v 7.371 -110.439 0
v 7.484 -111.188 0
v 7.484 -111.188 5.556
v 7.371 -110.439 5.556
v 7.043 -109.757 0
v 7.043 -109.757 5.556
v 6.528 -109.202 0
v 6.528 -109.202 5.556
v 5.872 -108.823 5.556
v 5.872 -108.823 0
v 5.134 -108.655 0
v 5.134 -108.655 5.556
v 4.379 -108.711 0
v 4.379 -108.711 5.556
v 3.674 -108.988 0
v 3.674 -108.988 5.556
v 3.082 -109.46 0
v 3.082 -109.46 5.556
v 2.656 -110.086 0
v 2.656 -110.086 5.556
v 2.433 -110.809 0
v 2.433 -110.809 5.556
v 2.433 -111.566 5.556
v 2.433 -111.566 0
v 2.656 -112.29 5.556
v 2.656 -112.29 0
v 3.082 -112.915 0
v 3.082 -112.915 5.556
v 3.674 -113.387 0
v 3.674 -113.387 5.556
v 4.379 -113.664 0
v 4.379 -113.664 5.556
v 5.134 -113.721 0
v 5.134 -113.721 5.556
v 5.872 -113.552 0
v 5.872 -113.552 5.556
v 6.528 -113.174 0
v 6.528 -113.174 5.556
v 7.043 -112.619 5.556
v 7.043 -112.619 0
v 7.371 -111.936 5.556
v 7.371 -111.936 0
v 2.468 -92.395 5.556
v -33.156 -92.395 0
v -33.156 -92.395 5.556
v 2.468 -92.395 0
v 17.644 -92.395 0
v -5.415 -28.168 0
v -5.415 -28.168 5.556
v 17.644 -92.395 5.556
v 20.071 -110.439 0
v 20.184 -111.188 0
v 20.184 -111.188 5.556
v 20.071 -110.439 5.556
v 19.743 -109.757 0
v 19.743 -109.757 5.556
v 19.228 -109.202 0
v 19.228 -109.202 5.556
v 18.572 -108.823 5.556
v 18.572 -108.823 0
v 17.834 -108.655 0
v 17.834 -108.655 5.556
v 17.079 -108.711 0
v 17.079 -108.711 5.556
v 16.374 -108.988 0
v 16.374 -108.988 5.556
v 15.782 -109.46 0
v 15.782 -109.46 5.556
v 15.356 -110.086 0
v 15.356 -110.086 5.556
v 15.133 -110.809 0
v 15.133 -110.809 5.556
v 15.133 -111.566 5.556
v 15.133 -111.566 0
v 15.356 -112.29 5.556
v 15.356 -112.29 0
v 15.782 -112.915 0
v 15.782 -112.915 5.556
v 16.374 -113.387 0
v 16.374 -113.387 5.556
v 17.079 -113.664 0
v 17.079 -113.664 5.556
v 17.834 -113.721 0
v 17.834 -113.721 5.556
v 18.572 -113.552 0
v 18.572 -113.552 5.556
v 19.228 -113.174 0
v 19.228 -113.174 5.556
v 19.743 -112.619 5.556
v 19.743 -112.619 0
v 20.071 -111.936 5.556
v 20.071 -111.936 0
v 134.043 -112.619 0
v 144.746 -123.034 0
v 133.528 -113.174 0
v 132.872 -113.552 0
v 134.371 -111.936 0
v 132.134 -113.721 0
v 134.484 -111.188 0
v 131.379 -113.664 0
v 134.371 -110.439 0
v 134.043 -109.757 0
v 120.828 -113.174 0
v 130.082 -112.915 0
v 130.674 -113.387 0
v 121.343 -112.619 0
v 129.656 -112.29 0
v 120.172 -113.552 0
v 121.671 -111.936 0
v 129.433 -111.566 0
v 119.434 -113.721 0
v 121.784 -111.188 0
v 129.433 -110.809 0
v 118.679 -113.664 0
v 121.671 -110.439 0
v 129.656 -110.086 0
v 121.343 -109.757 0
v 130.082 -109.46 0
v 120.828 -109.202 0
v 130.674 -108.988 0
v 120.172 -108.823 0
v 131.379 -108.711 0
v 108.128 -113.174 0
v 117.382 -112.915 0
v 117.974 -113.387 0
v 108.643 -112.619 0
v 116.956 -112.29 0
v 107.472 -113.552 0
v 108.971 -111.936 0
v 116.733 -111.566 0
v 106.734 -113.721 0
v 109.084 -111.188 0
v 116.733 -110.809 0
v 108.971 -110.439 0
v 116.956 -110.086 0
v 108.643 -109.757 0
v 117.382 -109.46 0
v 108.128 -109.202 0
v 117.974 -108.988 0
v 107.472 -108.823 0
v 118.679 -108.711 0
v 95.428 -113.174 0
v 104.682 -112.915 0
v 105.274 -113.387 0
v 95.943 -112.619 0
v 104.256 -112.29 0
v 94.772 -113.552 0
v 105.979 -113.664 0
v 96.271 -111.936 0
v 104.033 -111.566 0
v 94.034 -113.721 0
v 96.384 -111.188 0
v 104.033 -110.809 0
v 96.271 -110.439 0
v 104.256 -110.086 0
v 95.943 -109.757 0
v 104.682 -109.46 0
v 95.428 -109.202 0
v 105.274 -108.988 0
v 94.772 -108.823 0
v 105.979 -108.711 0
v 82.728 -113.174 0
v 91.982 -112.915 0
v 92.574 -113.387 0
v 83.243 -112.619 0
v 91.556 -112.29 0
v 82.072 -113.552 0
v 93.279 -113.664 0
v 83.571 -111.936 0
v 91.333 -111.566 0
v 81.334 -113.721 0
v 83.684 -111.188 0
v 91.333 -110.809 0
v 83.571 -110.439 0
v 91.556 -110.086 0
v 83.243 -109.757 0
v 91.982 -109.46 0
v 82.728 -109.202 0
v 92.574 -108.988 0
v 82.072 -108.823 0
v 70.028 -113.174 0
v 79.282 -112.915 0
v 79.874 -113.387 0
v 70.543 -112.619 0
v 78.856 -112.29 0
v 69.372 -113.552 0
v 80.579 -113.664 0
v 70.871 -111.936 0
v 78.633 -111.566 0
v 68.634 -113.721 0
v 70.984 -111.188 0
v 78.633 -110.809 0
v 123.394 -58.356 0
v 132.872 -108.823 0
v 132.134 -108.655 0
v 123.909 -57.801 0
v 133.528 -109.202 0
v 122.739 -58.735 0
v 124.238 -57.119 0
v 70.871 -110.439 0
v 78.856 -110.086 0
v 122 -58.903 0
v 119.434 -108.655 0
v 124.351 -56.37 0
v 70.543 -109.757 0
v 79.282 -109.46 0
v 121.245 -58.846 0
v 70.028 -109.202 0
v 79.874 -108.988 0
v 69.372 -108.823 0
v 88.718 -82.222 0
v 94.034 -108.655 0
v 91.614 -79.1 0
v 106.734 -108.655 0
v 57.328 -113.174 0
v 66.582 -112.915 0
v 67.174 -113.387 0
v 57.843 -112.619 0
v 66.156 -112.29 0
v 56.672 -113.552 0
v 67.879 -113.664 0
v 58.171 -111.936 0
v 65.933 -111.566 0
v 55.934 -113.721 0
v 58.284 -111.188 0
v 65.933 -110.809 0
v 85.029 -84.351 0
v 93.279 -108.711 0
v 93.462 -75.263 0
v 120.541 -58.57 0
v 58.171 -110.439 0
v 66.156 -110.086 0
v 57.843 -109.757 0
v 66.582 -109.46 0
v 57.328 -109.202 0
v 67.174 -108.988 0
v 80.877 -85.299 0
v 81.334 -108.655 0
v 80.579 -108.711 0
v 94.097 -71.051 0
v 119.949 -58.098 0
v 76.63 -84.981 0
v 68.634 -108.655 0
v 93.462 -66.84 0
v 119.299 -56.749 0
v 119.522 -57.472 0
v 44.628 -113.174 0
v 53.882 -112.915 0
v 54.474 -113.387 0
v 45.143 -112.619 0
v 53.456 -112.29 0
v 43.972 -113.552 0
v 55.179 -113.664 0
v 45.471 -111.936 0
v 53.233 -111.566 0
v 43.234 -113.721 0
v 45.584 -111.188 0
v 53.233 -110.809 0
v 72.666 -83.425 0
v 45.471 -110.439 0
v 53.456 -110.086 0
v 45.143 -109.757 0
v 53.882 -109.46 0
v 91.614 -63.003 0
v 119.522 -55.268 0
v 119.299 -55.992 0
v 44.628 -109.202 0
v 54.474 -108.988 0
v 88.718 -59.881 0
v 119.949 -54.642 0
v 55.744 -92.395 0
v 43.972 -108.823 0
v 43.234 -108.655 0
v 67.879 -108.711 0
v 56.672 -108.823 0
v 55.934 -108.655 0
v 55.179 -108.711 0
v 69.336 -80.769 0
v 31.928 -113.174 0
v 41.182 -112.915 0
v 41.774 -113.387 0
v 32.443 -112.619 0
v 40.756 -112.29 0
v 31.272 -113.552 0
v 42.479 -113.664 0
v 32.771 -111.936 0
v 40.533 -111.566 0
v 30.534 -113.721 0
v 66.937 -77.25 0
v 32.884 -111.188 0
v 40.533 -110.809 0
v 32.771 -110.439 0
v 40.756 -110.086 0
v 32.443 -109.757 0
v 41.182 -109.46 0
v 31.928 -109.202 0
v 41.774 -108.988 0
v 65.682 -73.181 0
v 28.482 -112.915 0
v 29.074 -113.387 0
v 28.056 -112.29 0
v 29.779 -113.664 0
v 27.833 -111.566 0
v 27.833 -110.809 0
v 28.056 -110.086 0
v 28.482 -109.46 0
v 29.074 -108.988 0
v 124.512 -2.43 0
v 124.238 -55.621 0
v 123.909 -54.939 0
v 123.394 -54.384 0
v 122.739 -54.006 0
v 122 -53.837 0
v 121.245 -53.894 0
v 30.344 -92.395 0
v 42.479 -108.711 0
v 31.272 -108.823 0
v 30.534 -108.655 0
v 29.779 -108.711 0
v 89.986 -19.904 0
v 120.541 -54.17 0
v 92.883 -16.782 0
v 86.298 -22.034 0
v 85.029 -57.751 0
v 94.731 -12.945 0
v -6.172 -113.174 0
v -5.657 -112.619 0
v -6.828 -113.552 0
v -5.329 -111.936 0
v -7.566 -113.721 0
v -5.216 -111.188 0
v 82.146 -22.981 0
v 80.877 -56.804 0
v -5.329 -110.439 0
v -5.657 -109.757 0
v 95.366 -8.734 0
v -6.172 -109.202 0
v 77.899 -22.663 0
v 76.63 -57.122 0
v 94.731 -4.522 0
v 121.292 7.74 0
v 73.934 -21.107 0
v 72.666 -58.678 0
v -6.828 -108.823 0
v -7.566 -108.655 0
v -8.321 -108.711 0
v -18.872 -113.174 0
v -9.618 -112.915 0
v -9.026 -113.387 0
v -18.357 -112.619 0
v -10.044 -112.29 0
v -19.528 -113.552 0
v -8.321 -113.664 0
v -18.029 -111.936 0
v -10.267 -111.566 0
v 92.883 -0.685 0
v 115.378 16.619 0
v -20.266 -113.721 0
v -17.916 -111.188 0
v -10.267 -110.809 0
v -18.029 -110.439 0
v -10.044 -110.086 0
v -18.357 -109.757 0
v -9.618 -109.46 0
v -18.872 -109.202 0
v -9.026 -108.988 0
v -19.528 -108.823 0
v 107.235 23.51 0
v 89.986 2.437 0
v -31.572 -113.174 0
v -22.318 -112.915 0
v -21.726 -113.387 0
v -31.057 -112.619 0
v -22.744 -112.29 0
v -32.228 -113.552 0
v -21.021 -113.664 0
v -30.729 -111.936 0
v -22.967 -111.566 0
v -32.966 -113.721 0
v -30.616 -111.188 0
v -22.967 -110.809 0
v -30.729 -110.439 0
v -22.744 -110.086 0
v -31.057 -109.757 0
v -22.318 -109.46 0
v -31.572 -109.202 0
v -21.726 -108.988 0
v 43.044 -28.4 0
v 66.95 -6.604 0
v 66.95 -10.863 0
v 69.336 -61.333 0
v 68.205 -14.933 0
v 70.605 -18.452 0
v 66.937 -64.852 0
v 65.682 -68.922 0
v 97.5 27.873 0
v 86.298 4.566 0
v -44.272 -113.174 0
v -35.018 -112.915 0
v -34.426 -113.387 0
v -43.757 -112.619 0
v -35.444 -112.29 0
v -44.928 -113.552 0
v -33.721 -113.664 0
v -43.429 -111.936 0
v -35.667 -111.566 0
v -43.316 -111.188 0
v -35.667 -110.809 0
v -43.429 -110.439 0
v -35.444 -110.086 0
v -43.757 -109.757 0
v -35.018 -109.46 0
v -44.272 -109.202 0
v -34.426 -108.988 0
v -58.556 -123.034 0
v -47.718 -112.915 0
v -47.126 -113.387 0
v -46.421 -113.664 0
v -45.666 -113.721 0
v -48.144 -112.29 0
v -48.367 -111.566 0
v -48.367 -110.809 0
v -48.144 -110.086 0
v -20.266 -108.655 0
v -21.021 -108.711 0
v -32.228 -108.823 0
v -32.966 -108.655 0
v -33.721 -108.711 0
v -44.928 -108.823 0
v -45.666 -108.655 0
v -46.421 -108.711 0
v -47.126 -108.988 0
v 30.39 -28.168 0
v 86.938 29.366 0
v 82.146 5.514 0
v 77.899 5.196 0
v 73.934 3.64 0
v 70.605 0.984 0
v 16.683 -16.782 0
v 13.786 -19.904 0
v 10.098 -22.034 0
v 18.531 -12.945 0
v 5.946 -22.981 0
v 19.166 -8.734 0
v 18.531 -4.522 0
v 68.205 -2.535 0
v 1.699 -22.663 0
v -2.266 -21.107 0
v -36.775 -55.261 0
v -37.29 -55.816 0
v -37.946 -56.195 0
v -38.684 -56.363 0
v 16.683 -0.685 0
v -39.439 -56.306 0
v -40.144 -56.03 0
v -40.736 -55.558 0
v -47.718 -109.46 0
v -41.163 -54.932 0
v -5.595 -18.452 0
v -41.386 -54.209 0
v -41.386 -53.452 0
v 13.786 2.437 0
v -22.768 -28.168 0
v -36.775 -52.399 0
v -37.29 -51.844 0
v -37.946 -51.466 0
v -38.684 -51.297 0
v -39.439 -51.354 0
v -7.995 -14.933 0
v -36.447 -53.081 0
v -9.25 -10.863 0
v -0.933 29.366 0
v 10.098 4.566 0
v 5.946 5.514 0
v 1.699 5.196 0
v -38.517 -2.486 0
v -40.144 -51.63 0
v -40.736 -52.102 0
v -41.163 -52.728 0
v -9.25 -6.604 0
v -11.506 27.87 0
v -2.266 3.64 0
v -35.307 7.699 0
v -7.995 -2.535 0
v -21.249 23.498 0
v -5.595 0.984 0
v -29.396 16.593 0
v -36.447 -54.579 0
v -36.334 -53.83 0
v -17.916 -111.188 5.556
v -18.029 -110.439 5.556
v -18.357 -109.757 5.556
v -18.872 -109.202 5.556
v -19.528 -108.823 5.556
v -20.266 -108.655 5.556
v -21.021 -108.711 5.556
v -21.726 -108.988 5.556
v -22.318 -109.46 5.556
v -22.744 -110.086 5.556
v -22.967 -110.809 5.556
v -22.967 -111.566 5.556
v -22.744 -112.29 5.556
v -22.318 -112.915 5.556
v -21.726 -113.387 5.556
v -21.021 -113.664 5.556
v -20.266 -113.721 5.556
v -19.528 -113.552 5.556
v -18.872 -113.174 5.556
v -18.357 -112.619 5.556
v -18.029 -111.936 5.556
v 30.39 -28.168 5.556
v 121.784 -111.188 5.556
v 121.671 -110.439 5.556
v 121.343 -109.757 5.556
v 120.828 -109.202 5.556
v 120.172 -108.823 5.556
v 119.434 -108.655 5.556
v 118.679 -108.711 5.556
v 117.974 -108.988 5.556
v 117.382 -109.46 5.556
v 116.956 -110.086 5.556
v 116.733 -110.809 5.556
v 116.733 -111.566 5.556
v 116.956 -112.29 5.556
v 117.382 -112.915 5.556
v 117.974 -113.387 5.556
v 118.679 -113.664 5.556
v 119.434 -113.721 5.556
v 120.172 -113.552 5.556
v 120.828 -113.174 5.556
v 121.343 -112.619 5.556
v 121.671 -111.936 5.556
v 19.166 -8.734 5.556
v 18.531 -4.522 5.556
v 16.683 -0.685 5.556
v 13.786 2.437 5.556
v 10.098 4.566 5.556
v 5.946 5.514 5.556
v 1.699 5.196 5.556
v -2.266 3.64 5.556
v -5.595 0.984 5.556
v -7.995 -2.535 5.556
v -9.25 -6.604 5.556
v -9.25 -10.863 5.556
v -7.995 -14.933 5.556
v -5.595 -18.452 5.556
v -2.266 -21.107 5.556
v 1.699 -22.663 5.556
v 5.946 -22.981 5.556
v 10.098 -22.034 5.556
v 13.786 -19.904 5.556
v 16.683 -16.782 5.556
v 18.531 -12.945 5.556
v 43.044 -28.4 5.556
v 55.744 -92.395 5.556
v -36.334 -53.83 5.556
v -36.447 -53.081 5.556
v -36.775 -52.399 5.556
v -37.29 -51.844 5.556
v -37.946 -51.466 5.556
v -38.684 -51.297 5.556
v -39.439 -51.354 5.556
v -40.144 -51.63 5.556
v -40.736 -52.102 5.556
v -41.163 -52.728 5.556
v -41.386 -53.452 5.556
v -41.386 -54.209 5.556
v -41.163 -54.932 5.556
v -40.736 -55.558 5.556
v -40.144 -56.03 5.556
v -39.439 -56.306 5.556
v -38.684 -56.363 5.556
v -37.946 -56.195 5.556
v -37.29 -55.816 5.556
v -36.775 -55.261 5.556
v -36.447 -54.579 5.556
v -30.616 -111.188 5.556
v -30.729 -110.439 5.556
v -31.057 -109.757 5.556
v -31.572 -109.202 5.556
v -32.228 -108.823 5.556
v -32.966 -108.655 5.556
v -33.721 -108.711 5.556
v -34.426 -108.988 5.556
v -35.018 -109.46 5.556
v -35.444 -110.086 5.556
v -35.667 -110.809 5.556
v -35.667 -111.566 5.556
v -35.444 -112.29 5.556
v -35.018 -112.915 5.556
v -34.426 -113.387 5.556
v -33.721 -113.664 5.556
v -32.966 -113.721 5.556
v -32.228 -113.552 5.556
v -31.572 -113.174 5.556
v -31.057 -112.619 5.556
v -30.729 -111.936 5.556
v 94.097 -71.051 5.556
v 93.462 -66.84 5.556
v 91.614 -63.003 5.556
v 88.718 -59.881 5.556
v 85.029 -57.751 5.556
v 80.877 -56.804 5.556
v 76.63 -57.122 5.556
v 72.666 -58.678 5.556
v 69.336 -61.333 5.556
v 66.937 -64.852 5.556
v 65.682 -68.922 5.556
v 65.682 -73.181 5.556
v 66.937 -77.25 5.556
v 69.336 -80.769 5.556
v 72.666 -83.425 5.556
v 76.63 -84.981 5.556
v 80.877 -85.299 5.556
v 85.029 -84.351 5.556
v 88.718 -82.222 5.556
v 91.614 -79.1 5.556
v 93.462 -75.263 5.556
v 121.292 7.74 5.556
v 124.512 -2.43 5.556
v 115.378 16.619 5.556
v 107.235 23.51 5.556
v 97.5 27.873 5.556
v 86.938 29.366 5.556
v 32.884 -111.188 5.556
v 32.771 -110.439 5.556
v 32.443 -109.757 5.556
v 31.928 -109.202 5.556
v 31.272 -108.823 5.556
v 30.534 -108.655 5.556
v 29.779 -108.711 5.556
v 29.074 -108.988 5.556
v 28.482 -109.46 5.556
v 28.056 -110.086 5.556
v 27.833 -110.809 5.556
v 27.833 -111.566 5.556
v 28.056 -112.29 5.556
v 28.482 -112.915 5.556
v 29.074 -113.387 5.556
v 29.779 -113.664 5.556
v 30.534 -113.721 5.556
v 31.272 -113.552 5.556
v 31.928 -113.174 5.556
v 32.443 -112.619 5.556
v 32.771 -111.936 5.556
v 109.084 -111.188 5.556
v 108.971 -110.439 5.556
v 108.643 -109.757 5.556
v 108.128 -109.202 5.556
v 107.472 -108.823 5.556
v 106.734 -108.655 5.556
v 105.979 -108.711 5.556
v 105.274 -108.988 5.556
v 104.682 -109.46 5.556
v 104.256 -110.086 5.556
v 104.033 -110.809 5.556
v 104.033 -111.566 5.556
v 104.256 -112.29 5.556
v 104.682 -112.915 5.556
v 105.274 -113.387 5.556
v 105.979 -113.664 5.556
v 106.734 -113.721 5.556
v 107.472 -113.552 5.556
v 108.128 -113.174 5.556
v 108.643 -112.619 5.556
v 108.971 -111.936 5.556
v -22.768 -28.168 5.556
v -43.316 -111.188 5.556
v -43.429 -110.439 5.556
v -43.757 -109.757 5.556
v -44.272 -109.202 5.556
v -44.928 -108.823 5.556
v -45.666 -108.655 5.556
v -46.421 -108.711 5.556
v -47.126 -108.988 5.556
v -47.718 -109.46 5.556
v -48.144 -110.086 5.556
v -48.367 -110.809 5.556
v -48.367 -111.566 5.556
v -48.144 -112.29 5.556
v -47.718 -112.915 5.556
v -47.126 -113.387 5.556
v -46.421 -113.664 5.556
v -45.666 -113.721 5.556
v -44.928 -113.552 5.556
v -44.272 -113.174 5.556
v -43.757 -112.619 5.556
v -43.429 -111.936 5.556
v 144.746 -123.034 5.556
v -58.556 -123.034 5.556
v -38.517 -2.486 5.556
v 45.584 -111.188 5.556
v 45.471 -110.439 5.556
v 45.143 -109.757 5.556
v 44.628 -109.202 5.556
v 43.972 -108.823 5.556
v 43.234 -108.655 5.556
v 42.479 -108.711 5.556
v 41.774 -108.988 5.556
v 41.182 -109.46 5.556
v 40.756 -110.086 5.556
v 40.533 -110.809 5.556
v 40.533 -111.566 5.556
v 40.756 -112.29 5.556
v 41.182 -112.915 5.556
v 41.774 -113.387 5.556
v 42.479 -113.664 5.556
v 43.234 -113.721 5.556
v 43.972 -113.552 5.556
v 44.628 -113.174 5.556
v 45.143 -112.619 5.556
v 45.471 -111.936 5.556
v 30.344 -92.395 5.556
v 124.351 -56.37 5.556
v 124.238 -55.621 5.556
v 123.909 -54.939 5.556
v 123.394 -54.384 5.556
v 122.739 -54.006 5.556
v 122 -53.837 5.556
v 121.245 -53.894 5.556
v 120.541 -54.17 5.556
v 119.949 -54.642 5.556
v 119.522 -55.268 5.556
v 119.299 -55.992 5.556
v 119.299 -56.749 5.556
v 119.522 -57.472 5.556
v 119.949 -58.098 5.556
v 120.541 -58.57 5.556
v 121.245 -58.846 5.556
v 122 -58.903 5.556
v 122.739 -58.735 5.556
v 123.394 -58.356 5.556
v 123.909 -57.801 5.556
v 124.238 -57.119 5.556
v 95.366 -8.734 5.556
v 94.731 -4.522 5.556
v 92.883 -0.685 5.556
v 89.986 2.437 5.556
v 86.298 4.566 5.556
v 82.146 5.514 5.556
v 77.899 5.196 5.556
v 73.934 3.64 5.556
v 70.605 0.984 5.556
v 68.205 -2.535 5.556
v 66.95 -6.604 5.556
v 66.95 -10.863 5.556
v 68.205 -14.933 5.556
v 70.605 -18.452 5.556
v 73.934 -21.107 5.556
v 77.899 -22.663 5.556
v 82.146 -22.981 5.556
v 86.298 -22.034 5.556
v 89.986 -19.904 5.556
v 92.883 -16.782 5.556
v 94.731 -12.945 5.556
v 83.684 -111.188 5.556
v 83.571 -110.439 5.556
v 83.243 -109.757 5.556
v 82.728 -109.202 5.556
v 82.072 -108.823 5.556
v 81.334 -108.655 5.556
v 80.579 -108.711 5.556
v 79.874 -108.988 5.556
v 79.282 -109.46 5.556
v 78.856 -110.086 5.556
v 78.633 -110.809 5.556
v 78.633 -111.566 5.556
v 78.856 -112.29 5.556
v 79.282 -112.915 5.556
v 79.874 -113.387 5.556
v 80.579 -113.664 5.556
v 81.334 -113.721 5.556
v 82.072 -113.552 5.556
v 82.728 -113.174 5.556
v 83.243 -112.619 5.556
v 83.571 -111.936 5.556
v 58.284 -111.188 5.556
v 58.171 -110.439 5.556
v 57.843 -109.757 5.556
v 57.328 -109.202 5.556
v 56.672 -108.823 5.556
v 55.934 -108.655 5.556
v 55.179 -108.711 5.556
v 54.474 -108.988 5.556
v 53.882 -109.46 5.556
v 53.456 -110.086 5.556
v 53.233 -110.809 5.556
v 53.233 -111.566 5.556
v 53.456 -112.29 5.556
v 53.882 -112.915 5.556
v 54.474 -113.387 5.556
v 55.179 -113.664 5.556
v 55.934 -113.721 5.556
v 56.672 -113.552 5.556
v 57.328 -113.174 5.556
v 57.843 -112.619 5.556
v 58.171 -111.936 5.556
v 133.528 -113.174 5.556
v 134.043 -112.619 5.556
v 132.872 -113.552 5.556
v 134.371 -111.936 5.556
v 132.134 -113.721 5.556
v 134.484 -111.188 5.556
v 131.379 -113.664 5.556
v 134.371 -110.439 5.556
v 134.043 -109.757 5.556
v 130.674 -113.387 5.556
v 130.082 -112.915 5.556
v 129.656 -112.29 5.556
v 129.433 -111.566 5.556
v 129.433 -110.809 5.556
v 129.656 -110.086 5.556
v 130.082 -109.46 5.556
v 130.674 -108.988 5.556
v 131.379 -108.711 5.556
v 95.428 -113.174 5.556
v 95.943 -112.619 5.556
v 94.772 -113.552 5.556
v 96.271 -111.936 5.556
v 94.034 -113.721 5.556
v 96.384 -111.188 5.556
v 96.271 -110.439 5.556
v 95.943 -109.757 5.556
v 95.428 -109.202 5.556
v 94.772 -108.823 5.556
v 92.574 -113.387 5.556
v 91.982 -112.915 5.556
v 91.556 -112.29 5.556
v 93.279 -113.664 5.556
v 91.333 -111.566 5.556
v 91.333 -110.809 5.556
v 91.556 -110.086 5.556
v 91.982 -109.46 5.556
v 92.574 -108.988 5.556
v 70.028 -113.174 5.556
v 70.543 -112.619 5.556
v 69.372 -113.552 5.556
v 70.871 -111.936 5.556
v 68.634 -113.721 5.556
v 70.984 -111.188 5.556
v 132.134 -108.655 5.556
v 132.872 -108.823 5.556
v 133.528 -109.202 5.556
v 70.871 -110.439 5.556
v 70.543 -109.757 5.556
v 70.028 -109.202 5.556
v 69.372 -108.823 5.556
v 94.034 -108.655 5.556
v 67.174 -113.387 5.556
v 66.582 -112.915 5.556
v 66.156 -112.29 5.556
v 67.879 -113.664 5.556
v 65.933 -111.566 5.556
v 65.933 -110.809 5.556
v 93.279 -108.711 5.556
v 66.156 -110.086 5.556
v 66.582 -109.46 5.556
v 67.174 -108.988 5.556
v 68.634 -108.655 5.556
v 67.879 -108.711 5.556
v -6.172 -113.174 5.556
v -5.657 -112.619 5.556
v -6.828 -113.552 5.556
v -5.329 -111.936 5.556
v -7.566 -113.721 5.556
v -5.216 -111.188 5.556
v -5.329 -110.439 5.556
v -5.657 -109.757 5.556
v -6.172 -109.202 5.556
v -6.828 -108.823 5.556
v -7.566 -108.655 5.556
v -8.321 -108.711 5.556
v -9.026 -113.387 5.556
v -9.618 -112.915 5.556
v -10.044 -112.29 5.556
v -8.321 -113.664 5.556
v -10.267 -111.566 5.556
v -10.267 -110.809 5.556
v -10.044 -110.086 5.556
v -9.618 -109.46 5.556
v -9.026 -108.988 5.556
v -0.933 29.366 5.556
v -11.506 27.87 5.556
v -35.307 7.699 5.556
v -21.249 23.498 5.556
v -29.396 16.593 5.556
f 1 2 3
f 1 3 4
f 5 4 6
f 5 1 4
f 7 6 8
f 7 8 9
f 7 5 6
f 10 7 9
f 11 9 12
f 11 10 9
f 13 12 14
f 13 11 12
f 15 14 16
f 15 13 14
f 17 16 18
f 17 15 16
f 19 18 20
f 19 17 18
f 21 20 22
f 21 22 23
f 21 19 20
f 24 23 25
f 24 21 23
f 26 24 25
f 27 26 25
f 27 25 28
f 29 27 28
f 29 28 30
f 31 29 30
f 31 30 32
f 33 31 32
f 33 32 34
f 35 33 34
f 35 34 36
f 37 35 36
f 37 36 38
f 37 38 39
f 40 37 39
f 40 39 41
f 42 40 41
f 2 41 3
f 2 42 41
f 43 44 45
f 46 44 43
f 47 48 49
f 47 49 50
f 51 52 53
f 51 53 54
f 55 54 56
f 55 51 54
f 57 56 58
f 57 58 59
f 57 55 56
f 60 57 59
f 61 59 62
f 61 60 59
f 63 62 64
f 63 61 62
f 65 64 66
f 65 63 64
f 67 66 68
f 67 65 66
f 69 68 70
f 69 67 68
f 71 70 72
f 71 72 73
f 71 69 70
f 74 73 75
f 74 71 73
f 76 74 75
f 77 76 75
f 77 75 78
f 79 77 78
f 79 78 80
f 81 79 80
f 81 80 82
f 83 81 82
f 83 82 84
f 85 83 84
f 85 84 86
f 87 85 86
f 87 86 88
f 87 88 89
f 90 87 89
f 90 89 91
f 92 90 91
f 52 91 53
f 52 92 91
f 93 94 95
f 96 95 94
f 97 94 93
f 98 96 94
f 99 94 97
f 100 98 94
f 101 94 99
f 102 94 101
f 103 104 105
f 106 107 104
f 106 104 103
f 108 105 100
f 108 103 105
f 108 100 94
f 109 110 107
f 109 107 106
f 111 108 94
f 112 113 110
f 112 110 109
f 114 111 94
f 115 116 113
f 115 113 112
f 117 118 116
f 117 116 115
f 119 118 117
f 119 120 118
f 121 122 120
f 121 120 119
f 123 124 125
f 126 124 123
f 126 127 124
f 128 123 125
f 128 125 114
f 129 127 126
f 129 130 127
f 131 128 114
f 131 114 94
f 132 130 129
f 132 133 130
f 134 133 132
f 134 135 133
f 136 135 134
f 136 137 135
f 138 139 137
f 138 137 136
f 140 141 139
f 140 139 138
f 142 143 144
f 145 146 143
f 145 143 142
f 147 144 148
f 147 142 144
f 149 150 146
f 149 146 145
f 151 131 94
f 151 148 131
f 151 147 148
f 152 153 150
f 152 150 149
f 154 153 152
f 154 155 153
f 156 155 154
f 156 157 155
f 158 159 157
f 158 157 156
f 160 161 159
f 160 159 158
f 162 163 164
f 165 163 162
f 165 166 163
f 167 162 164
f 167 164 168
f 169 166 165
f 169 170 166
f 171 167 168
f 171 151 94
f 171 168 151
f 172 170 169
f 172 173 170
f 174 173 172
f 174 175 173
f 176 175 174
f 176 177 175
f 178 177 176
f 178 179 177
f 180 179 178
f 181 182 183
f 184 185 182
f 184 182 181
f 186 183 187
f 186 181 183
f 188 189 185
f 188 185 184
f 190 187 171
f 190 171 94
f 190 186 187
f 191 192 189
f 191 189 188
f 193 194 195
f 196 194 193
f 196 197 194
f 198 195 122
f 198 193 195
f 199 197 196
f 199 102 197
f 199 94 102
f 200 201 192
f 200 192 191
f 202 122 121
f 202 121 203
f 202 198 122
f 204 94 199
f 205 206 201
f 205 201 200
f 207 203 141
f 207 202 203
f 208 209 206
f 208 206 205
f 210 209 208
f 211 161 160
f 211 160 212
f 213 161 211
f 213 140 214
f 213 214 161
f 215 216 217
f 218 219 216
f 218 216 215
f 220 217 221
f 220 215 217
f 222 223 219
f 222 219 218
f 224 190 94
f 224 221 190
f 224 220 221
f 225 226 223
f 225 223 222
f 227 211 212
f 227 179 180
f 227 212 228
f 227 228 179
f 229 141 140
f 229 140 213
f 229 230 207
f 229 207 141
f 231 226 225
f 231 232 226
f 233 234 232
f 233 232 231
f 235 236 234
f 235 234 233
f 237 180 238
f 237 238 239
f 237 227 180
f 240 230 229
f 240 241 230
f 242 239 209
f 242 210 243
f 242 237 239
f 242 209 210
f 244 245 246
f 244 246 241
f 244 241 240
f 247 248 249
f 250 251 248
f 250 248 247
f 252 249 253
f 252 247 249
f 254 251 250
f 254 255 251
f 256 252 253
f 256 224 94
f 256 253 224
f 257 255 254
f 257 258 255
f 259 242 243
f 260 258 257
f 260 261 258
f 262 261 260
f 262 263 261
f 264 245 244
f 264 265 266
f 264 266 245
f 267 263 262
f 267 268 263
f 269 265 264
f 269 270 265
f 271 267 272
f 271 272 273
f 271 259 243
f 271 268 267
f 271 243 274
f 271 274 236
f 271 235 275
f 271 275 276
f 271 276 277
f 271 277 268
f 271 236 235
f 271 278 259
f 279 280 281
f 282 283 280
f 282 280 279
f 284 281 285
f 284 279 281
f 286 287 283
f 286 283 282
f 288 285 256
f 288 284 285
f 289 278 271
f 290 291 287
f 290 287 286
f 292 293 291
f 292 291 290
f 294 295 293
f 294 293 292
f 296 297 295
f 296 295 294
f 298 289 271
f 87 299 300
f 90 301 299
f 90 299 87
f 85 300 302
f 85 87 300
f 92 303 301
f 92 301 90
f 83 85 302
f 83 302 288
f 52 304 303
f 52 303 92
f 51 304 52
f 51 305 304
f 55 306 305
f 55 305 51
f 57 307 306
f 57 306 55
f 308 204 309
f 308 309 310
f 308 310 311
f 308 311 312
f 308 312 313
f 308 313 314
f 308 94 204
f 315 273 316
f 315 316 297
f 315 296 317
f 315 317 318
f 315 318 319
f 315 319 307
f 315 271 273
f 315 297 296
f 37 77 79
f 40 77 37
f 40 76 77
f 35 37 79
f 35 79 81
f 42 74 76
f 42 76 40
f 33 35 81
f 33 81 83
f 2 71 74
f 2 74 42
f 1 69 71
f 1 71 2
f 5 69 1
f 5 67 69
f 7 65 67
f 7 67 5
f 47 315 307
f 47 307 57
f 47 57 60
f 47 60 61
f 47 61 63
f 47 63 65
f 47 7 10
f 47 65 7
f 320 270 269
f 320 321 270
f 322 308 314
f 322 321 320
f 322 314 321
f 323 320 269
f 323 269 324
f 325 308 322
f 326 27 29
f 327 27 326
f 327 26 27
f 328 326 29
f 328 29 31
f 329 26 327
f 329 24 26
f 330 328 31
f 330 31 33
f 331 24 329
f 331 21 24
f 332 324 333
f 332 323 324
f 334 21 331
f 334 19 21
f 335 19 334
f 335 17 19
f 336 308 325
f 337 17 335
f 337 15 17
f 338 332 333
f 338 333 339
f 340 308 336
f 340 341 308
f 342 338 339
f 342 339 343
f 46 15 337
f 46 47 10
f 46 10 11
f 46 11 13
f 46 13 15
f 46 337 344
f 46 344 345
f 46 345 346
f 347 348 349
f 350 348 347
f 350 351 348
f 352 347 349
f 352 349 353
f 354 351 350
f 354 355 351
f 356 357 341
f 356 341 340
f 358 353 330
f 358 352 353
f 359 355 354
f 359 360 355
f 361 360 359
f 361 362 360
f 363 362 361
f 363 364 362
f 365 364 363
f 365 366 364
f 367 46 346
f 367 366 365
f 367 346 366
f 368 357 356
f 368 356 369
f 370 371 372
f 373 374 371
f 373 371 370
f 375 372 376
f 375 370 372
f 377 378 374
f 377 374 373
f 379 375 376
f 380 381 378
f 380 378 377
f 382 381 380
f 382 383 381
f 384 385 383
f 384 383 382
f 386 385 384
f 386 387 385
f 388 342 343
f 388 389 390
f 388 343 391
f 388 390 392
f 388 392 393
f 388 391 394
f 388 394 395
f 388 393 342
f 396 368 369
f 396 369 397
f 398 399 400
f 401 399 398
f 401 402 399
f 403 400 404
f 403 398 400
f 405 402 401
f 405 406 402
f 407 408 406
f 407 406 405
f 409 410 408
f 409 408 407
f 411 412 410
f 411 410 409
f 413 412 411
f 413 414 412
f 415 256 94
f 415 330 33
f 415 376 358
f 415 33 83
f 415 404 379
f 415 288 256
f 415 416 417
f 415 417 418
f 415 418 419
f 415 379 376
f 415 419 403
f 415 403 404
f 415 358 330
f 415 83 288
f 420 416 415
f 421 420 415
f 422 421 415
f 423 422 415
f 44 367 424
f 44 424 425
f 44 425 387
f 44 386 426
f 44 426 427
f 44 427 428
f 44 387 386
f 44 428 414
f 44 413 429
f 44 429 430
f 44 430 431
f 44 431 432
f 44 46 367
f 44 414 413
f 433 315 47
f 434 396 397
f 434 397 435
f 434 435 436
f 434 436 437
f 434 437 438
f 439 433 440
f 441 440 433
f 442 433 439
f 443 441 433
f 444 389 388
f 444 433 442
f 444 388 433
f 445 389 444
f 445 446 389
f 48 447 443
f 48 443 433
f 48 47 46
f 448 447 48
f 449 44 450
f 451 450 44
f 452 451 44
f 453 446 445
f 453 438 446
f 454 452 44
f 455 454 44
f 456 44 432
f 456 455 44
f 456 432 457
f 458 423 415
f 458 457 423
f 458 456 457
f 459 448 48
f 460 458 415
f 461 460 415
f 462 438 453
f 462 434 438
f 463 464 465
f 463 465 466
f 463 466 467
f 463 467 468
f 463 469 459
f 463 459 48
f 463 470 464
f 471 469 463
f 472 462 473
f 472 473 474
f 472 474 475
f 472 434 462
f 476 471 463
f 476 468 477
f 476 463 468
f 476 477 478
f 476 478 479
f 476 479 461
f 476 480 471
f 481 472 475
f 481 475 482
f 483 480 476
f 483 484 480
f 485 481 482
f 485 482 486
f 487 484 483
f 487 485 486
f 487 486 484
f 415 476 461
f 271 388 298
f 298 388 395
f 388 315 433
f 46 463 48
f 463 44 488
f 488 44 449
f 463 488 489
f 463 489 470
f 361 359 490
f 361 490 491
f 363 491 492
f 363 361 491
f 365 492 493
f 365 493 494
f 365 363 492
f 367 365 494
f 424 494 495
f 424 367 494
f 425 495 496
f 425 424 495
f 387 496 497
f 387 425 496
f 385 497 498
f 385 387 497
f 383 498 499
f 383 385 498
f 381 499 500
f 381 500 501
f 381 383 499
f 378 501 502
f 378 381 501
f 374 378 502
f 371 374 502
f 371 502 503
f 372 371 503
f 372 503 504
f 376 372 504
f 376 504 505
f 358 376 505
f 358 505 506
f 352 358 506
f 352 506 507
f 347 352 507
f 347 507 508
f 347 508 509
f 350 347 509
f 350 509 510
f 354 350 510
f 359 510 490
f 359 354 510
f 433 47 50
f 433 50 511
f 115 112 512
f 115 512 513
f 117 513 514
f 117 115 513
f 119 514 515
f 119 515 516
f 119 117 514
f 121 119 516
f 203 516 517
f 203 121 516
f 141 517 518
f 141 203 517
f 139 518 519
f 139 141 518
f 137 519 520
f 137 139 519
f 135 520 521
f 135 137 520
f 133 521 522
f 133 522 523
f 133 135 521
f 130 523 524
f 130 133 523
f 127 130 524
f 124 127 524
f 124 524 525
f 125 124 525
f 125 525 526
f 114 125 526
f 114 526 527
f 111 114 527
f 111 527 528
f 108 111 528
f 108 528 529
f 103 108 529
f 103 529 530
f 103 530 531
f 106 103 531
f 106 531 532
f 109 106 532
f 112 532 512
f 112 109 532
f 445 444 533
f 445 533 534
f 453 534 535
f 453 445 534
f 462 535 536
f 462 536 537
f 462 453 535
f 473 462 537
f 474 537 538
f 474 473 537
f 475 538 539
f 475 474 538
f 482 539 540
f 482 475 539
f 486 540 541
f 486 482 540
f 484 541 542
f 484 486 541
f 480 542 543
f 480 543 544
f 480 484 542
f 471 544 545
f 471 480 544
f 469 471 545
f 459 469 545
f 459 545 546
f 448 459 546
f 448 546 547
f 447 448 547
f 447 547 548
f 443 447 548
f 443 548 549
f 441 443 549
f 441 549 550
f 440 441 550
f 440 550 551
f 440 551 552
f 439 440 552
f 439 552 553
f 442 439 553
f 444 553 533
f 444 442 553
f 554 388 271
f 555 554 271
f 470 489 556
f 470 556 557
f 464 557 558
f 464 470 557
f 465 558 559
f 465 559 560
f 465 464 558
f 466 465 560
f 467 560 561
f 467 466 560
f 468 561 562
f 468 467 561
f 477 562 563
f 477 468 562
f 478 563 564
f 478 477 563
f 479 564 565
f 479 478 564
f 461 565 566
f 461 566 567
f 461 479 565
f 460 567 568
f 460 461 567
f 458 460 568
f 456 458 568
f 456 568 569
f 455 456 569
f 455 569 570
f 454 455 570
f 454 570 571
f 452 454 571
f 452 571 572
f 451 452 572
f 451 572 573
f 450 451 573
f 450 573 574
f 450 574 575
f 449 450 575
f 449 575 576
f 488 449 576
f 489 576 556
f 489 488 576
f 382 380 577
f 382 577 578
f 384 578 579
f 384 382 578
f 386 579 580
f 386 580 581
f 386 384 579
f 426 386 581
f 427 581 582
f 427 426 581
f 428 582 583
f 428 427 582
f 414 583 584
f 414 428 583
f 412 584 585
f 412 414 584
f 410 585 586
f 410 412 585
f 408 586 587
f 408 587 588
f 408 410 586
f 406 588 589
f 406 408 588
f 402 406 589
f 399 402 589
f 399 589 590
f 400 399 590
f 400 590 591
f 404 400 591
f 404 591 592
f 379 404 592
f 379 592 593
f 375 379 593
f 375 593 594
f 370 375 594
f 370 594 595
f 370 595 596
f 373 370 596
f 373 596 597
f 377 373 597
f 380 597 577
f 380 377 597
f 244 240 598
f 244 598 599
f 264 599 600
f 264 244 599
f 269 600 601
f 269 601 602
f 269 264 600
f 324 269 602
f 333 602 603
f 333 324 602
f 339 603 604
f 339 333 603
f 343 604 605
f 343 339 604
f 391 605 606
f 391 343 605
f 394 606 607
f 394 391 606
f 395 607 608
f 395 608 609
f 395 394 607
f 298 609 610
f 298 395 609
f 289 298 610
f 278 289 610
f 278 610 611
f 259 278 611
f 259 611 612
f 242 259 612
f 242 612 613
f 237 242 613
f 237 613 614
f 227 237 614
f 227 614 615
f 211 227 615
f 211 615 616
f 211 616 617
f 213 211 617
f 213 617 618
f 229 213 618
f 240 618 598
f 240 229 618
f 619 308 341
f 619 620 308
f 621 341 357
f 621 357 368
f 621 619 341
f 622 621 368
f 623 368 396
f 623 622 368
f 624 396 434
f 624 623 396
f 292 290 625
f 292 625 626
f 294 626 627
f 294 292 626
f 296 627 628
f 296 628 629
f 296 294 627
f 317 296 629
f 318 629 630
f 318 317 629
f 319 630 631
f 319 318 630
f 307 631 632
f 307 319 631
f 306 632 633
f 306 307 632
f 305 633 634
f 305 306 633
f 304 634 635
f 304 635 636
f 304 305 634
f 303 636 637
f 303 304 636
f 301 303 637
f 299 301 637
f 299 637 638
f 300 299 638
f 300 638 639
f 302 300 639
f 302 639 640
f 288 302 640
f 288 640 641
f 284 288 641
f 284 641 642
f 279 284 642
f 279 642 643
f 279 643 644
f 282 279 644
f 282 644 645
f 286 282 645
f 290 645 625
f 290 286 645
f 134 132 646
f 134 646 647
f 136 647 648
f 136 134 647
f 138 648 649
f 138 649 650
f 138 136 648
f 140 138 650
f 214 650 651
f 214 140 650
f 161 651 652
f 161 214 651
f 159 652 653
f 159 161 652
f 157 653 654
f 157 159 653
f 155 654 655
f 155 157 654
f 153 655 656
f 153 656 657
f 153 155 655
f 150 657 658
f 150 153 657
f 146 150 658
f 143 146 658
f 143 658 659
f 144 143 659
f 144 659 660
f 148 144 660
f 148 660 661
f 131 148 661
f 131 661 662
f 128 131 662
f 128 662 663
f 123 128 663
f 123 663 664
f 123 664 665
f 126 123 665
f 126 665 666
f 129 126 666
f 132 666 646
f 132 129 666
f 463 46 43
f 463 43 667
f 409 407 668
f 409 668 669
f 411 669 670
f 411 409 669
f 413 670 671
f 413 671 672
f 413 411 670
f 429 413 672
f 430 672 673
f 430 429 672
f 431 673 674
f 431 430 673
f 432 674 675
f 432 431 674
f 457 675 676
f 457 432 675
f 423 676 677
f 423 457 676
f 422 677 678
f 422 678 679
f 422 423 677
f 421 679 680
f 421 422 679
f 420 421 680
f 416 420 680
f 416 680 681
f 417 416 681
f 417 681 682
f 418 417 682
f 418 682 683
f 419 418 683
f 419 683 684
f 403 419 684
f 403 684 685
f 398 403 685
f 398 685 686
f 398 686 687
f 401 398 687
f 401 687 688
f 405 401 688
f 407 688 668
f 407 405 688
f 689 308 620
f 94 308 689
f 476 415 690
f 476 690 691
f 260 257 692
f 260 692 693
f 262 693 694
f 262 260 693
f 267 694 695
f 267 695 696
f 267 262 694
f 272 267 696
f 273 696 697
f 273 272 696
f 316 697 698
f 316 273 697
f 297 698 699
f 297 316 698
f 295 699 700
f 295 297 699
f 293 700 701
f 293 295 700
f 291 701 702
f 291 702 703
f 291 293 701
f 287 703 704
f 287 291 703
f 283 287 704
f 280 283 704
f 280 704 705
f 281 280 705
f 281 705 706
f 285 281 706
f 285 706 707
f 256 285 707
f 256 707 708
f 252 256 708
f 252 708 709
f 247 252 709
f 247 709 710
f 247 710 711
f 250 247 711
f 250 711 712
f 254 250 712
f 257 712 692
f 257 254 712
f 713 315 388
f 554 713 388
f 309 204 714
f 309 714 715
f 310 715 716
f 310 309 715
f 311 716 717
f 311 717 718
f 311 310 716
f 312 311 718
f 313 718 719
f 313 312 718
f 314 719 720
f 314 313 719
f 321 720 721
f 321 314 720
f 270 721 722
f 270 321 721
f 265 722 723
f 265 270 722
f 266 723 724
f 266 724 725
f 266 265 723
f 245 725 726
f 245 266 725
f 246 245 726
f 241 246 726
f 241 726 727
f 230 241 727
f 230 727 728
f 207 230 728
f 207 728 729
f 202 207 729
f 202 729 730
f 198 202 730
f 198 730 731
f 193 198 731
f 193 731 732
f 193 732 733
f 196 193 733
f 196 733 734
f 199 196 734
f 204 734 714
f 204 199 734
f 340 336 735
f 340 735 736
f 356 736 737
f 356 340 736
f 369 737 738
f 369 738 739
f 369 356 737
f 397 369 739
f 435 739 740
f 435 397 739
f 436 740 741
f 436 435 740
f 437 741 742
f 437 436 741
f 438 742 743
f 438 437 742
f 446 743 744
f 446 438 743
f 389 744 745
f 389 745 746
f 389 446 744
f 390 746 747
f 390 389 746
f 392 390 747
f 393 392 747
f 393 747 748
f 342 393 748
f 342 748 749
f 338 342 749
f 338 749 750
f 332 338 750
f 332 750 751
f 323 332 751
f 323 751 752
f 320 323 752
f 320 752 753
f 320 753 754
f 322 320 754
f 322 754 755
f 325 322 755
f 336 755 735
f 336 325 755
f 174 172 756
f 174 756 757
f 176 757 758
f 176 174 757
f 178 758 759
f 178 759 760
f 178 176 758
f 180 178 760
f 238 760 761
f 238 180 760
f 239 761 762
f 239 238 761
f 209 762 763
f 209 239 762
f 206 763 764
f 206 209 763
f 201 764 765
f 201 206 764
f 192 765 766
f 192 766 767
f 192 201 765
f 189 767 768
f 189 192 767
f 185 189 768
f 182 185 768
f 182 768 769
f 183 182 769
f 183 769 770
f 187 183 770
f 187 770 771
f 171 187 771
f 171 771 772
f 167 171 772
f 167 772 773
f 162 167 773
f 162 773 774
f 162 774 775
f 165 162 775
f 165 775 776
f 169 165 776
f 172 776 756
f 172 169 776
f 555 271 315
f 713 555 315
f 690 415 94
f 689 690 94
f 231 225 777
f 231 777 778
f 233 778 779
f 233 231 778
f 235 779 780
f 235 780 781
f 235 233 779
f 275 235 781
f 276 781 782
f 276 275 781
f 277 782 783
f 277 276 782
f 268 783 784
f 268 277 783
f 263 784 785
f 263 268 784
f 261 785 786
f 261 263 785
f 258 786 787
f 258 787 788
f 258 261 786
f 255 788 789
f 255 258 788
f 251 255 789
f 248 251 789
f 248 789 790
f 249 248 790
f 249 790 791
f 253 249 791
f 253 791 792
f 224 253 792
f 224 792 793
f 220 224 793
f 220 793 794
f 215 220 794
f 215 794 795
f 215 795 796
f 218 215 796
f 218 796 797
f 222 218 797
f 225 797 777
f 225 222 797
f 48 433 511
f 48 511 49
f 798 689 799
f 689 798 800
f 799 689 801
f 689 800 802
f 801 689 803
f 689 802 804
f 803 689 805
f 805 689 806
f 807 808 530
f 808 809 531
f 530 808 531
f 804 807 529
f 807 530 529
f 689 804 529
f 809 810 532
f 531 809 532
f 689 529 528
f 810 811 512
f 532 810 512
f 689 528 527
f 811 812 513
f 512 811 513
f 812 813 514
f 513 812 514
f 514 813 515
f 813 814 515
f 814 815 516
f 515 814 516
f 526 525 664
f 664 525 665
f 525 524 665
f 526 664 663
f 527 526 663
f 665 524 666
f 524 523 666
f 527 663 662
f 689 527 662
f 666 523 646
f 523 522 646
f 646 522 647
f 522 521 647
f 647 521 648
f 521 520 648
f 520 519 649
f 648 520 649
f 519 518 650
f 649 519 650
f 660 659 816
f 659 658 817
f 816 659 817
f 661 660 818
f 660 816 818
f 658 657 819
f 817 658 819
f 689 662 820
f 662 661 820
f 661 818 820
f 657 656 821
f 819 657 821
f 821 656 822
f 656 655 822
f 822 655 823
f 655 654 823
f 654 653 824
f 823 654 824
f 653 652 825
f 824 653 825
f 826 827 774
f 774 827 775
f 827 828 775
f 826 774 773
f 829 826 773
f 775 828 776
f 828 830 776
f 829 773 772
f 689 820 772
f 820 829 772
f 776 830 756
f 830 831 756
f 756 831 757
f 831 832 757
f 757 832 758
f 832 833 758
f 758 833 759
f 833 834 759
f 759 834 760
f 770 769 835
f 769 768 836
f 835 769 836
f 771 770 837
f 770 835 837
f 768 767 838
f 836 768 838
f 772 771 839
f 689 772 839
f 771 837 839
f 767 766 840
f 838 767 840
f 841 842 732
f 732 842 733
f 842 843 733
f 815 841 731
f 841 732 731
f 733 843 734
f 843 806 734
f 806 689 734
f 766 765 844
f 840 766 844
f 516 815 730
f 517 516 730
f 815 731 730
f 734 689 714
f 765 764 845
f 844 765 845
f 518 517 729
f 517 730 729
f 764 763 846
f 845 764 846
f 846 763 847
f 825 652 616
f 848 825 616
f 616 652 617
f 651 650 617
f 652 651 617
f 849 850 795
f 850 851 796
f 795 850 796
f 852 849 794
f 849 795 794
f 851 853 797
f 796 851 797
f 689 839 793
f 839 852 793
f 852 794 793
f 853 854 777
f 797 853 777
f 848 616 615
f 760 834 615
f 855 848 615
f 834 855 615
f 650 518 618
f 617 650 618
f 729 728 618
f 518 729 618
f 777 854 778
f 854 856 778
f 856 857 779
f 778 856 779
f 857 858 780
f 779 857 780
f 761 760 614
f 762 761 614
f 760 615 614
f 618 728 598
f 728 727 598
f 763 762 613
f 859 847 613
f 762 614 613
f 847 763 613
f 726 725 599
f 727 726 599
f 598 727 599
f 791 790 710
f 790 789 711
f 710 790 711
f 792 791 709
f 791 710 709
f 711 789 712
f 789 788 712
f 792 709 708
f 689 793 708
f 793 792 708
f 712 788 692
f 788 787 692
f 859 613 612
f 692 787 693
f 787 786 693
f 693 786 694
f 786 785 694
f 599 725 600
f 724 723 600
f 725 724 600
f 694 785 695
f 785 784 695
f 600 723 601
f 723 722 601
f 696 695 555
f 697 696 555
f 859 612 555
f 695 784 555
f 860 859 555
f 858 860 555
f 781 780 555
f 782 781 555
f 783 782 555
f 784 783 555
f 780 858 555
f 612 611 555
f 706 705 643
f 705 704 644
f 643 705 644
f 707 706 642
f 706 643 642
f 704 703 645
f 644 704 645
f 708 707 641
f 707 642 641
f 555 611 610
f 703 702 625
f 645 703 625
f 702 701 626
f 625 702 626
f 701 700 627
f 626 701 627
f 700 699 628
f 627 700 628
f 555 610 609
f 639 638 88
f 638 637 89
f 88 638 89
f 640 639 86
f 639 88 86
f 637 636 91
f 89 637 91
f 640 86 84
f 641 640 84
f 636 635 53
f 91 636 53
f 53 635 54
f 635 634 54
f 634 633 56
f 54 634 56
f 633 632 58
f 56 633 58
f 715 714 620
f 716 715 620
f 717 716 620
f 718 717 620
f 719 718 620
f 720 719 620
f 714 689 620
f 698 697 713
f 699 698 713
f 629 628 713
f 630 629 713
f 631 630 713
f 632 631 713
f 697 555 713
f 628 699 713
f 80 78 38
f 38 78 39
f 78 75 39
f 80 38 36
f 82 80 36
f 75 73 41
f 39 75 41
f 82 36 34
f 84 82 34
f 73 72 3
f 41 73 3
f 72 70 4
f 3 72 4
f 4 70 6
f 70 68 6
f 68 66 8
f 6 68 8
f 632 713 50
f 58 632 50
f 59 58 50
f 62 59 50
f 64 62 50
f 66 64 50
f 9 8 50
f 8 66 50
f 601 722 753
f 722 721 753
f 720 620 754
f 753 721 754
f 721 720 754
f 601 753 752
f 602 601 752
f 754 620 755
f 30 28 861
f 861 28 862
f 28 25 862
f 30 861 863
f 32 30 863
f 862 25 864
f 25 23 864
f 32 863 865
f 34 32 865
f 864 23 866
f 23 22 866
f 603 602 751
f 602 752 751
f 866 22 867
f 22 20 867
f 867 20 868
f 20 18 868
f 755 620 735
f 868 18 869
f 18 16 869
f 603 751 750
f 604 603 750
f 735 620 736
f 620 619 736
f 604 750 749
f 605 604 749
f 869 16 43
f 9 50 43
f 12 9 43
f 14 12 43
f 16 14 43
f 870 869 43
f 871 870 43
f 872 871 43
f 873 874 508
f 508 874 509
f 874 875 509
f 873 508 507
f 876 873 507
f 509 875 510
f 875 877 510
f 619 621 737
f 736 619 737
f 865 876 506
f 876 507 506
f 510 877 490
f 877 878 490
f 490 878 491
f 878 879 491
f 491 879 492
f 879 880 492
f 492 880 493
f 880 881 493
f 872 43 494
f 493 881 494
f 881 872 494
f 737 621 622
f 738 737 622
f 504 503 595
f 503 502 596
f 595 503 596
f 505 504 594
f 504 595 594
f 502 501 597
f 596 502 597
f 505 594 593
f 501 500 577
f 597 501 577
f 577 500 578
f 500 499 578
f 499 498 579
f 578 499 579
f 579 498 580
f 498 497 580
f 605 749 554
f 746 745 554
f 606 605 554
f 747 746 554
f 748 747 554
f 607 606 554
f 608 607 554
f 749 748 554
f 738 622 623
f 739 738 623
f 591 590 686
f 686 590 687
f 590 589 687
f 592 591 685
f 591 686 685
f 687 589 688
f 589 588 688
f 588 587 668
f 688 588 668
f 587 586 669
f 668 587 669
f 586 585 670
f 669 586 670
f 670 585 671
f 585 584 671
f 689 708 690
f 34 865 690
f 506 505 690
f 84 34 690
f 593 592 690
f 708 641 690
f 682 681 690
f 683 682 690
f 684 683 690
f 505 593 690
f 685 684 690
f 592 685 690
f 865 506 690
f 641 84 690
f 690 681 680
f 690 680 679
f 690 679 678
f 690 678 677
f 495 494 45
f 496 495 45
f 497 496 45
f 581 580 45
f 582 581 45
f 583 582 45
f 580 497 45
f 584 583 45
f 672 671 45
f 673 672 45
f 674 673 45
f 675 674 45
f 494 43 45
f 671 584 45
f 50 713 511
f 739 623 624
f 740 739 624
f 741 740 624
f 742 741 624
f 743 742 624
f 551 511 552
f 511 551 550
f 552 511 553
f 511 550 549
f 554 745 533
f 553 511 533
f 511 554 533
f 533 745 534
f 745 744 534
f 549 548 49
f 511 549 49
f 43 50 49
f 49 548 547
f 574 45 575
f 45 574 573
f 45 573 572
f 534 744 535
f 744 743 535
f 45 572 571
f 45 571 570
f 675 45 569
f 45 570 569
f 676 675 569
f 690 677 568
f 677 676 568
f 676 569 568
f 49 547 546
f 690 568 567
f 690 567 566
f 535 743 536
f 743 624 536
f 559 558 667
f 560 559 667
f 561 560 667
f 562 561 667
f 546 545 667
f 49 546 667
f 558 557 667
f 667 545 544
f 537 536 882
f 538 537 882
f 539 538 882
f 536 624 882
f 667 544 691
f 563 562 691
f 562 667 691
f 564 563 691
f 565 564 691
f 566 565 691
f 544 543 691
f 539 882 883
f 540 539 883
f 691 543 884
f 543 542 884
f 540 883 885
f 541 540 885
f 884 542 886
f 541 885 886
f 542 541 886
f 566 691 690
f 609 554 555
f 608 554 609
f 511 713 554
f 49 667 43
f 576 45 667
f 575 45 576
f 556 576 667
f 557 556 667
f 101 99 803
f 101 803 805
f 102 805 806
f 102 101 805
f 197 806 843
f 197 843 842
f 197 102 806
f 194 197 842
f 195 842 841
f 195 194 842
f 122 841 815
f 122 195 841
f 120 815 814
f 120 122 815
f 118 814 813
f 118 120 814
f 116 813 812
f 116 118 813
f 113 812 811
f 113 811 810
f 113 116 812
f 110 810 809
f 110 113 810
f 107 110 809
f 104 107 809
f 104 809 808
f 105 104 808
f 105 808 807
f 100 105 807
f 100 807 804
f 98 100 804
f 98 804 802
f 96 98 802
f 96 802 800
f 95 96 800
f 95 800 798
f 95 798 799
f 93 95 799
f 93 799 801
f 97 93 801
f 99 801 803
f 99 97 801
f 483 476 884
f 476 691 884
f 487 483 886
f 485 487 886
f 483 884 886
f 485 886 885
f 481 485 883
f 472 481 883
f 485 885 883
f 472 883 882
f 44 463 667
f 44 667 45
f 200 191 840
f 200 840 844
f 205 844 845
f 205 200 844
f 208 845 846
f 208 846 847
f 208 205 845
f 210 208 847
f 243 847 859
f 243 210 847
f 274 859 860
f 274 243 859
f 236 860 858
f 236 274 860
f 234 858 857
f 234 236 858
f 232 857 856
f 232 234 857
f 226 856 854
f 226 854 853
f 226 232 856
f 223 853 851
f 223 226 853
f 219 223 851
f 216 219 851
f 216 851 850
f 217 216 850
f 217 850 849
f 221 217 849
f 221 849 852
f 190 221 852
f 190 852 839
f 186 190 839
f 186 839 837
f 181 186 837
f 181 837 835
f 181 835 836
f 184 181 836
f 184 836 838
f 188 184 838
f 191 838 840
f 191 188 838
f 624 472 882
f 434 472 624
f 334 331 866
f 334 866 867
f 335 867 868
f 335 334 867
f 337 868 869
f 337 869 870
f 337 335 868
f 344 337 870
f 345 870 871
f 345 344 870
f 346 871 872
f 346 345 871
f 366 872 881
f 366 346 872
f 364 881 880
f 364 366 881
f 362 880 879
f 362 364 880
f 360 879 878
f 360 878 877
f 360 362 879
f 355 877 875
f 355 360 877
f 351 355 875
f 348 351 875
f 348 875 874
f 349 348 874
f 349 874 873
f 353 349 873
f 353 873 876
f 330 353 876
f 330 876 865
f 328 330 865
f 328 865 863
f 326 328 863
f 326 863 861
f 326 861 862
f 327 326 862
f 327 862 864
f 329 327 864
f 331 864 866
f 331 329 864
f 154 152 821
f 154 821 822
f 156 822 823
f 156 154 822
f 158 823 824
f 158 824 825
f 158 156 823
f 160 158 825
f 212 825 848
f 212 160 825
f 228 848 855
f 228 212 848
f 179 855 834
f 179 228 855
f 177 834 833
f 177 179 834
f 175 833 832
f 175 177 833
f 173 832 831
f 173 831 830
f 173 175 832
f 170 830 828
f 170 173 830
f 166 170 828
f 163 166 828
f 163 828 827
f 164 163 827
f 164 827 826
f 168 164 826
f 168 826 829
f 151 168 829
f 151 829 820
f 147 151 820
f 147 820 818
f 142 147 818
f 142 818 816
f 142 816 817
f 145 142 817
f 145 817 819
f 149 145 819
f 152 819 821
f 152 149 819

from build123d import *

# Parameters (mm, degrees)
SKETCH2_R           = 14.2875
SKETCH2_R_2         = 2.54
BOSS_EXTRUDE1_DEPTH = 5.55625
FILLET1_R           = 38.1


with BuildPart() as part:
    # Sketch2 → Boss-Extrude1 (new body)
    with BuildSketch(Plane.XY):
        Polygon((-33.221954044, -123.033671084), (-58.55568732, -123.033671084), (-33.221954044, 29.366328916), (119.178045956, 29.366328916), (144.745882617, -123.033671084), (119.178045956, -123.033671084), align=None)
        with Locations((4.878045956, -8.733671084)):
            Circle(SKETCH2_R, mode=Mode.SUBTRACT)
        with Locations((81.078045956, -8.733671084)):
            Circle(SKETCH2_R, mode=Mode.SUBTRACT)
        with Locations((-45.85568732, -111.187710863)):
            Circle(SKETCH2_R_2, mode=Mode.SUBTRACT)
        with Locations((-33.15568732, -111.187710863)):
            Circle(SKETCH2_R_2, mode=Mode.SUBTRACT)
        with Locations((-20.45568732, -111.187710863)):
            Circle(SKETCH2_R_2, mode=Mode.SUBTRACT)
        with Locations((-7.75568732, -111.187710863)):
            Circle(SKETCH2_R_2, mode=Mode.SUBTRACT)
        with Locations((4.94431268, -111.187710863)):
            Circle(SKETCH2_R_2, mode=Mode.SUBTRACT)
        with Locations((17.64431268, -111.187710863)):
            Circle(SKETCH2_R_2, mode=Mode.SUBTRACT)
        with Locations((30.34431268, -111.187710863)):
            Circle(SKETCH2_R_2, mode=Mode.SUBTRACT)
        with Locations((43.04431268, -111.187710863)):
            Circle(SKETCH2_R_2, mode=Mode.SUBTRACT)
        with Locations((55.74431268, -111.187710863)):
            Circle(SKETCH2_R_2, mode=Mode.SUBTRACT)
        with Locations((68.44431268, -111.187710863)):
            Circle(SKETCH2_R_2, mode=Mode.SUBTRACT)
        with Locations((81.14431268, -111.187710863)):
            Circle(SKETCH2_R_2, mode=Mode.SUBTRACT)
        with Locations((93.84431268, -111.187710863)):
            Circle(SKETCH2_R_2, mode=Mode.SUBTRACT)
        with Locations((106.54431268, -111.187710863)):
            Circle(SKETCH2_R_2, mode=Mode.SUBTRACT)
        with Locations((119.24431268, -111.187710863)):
            Circle(SKETCH2_R_2, mode=Mode.SUBTRACT)
        with Locations((131.94431268, -111.187710863)):
            Circle(SKETCH2_R_2, mode=Mode.SUBTRACT)
        with Locations((79.809453324, -71.051356873)):
            Circle(SKETCH2_R, mode=Mode.SUBTRACT)
        with Locations((121.810607633, -56.370137575)):
            Circle(SKETCH2_R_2, mode=Mode.SUBTRACT)
        with Locations((-38.87409027, -53.830137575)):
            Circle(SKETCH2_R_2, mode=Mode.SUBTRACT)
        Polygon((-22.767796965, -28.16783361), (-33.15568732, -92.394571291), (2.468038836, -92.394571291), align=None, mode=Mode.SUBTRACT)
        Polygon((43.04431268, -28.399699089), (55.74431268, -92.394571291), (30.34431268, -92.394571291), align=None, mode=Mode.SUBTRACT)
        Polygon((17.64431268, -92.394571291), (30.390327173, -28.16783361), (-5.41538745, -28.16783361), align=None, mode=Mode.SUBTRACT)
    extrude(amount=BOSS_EXTRUDE1_DEPTH)

    # Fillet1
    fillet1_edges = [part.edges().sort_by_distance(p)[0] for p in [
        (-33.221954044, 29.366328916, 2.778125),
        (119.178045956, 29.366328916, 2.778125),
    ]]
    fillet(fillet1_edges, radius=FILLET1_R)


solid = part.part
